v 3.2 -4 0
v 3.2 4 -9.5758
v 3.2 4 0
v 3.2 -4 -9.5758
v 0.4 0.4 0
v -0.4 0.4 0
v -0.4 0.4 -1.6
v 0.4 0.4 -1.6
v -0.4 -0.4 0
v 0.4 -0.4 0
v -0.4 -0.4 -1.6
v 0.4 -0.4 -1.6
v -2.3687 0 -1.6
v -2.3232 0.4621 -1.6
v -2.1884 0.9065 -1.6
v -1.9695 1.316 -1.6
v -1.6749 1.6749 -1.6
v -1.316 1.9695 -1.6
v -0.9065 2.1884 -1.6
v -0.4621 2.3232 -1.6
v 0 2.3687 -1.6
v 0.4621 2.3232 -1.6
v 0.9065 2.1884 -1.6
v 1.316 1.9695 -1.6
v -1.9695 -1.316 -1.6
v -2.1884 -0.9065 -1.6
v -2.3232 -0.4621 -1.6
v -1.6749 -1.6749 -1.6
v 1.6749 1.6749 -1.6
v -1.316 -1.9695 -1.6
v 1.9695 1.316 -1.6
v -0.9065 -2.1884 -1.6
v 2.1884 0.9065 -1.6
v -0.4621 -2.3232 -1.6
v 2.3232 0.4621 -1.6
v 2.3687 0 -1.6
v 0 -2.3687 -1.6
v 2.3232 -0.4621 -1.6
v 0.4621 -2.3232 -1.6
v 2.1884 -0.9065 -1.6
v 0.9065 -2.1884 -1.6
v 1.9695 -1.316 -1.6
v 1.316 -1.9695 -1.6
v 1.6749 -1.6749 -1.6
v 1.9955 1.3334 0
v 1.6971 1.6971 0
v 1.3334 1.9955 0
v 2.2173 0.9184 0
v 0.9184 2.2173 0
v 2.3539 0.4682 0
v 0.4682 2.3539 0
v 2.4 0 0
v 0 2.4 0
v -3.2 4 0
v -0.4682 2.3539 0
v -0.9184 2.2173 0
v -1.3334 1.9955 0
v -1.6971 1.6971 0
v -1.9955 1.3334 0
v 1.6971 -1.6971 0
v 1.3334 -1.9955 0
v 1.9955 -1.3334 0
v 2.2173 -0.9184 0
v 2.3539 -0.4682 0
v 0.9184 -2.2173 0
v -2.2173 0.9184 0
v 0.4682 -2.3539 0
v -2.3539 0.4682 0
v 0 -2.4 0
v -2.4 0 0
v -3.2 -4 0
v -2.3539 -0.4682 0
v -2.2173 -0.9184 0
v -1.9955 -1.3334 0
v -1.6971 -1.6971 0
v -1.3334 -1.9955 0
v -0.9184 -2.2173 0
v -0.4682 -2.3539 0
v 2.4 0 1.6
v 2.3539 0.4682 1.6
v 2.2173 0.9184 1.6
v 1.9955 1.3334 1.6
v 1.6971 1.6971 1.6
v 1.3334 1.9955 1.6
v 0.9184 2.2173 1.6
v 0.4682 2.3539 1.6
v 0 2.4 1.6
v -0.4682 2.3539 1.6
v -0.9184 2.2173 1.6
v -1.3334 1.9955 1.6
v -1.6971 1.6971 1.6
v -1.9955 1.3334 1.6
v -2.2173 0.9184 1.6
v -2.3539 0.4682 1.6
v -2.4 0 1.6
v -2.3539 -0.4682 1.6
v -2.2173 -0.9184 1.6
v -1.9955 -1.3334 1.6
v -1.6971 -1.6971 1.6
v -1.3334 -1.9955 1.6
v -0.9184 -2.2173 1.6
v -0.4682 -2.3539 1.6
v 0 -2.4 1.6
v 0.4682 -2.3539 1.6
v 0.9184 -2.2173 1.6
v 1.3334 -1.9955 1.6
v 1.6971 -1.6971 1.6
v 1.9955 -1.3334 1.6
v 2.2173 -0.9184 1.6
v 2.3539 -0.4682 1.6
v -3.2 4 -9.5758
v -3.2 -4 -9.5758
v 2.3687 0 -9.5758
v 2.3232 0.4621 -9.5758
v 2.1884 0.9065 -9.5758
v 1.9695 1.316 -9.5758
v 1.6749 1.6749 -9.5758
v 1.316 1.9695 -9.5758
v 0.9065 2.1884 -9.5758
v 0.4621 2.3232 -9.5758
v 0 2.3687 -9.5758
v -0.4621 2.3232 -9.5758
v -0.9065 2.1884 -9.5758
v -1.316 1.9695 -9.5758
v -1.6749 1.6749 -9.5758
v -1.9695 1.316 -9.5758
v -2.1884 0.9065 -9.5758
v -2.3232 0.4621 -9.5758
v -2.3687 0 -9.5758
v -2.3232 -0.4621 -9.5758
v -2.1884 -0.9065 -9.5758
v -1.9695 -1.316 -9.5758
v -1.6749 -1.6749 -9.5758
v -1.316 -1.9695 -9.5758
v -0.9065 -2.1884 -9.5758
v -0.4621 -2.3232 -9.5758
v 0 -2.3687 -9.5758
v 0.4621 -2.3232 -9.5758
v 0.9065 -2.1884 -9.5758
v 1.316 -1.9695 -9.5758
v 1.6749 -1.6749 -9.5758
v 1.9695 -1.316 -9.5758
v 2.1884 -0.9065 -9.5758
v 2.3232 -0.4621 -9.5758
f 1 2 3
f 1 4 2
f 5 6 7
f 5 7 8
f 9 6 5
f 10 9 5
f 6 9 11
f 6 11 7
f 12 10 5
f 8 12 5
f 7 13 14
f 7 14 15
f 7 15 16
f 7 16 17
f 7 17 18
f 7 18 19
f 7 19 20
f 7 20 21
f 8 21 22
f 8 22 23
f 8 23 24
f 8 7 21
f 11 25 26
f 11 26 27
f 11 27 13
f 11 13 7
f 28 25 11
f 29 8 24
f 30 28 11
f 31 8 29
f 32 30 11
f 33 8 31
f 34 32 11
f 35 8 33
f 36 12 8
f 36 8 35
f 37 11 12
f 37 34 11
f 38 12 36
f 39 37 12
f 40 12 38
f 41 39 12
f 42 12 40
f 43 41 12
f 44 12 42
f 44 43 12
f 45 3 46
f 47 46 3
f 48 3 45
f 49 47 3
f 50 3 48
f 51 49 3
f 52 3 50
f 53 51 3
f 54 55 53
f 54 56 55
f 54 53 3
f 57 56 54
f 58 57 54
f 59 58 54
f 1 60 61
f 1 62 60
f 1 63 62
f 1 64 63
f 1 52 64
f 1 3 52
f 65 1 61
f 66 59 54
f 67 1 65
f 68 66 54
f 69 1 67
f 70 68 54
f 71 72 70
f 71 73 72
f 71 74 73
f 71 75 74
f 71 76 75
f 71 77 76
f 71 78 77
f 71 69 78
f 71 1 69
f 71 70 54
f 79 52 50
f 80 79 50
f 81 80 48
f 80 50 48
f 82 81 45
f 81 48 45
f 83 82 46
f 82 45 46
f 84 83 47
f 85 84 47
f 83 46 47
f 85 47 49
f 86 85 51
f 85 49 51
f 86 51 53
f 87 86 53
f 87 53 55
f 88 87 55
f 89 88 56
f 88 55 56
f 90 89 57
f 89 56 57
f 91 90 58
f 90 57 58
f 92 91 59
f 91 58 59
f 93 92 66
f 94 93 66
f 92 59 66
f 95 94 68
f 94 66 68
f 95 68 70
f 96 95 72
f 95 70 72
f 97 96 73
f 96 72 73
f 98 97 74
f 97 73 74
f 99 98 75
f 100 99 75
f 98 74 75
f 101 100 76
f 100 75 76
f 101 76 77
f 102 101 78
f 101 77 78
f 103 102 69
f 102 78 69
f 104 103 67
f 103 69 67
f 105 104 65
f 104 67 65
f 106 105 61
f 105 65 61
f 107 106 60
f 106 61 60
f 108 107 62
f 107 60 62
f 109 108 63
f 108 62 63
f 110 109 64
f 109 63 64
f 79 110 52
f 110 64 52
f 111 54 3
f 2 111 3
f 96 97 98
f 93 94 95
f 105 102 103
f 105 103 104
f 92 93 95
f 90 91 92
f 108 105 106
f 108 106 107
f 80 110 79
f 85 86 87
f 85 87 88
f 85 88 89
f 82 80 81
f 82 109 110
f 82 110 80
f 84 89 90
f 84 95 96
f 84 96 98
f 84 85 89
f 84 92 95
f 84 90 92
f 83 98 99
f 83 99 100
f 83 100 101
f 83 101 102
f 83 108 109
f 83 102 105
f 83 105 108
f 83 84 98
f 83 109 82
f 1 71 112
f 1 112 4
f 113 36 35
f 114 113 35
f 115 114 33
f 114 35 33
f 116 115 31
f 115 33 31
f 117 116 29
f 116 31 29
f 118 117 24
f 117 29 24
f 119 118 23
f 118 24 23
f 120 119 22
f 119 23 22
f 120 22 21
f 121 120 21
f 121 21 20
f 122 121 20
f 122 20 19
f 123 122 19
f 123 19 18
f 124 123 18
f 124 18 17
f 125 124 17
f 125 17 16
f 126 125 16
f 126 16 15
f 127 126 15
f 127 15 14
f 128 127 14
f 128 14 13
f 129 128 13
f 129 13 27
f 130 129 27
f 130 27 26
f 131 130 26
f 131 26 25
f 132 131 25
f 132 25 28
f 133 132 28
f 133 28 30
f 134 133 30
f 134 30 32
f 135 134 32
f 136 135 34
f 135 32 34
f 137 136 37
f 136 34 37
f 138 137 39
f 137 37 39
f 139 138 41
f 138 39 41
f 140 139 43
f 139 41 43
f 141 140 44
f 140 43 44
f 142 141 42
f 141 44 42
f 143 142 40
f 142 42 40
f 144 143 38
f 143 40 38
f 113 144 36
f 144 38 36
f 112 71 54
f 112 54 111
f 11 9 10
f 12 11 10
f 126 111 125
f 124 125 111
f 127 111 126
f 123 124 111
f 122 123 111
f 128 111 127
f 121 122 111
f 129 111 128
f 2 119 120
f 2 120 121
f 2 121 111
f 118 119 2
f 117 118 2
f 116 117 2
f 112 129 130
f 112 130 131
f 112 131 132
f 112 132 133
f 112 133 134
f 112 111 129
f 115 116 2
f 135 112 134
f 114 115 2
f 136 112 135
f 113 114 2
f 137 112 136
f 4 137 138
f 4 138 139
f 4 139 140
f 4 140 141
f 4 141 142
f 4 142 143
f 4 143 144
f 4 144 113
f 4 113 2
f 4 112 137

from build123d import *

# Parameters (mm, degrees)
F4_DEPTH  = 4.000005
F1_R      = 2.399995
F5_DEPTH  = 1.599999
F2_R      = 2.368695
F6_DEPTH  = 25.4
F6_FACE_R = 2.368695
F7_DEPTH  = 1.599999
F3_W      = 0.8
F3_H      = 0.8
F8_DEPTH  = 1.599999


with BuildPart() as f4:
    # F0 (on Front) → F4 (new body, symmetric)
    with BuildSketch(Plane.XZ):
        Polygon((3.200006, 0), (0, 0), (-3.200006, 0), (-3.200006, -9.5758), (3.200006, -9.5758), align=None)
    extrude(amount=F4_DEPTH, both=True)

    # F1 (on Top) → F5 (join)
    with BuildSketch(Plane.XY):
        Circle(F1_R)
    extrude(amount=F5_DEPTH)

    # F2 (on Top) → F6 (cut)
    with BuildSketch(Plane.XY):
        Circle(F2_R)
    extrude(amount=-F6_DEPTH, mode=Mode.SUBTRACT)

    # F6_face (on face) → F7 (join)
    with BuildSketch(Plane(origin=(0, 0, 0), x_dir=(1, 0, 0), z_dir=(0, 0, -1))):
        Circle(F6_FACE_R)
    extrude(amount=F7_DEPTH)

    # F3 (on Top) → F8 (cut)
    with BuildSketch(Plane.XY):
        Rectangle(F3_W, F3_H)
    extrude(amount=-F8_DEPTH, mode=Mode.SUBTRACT)


solid = f4.part
